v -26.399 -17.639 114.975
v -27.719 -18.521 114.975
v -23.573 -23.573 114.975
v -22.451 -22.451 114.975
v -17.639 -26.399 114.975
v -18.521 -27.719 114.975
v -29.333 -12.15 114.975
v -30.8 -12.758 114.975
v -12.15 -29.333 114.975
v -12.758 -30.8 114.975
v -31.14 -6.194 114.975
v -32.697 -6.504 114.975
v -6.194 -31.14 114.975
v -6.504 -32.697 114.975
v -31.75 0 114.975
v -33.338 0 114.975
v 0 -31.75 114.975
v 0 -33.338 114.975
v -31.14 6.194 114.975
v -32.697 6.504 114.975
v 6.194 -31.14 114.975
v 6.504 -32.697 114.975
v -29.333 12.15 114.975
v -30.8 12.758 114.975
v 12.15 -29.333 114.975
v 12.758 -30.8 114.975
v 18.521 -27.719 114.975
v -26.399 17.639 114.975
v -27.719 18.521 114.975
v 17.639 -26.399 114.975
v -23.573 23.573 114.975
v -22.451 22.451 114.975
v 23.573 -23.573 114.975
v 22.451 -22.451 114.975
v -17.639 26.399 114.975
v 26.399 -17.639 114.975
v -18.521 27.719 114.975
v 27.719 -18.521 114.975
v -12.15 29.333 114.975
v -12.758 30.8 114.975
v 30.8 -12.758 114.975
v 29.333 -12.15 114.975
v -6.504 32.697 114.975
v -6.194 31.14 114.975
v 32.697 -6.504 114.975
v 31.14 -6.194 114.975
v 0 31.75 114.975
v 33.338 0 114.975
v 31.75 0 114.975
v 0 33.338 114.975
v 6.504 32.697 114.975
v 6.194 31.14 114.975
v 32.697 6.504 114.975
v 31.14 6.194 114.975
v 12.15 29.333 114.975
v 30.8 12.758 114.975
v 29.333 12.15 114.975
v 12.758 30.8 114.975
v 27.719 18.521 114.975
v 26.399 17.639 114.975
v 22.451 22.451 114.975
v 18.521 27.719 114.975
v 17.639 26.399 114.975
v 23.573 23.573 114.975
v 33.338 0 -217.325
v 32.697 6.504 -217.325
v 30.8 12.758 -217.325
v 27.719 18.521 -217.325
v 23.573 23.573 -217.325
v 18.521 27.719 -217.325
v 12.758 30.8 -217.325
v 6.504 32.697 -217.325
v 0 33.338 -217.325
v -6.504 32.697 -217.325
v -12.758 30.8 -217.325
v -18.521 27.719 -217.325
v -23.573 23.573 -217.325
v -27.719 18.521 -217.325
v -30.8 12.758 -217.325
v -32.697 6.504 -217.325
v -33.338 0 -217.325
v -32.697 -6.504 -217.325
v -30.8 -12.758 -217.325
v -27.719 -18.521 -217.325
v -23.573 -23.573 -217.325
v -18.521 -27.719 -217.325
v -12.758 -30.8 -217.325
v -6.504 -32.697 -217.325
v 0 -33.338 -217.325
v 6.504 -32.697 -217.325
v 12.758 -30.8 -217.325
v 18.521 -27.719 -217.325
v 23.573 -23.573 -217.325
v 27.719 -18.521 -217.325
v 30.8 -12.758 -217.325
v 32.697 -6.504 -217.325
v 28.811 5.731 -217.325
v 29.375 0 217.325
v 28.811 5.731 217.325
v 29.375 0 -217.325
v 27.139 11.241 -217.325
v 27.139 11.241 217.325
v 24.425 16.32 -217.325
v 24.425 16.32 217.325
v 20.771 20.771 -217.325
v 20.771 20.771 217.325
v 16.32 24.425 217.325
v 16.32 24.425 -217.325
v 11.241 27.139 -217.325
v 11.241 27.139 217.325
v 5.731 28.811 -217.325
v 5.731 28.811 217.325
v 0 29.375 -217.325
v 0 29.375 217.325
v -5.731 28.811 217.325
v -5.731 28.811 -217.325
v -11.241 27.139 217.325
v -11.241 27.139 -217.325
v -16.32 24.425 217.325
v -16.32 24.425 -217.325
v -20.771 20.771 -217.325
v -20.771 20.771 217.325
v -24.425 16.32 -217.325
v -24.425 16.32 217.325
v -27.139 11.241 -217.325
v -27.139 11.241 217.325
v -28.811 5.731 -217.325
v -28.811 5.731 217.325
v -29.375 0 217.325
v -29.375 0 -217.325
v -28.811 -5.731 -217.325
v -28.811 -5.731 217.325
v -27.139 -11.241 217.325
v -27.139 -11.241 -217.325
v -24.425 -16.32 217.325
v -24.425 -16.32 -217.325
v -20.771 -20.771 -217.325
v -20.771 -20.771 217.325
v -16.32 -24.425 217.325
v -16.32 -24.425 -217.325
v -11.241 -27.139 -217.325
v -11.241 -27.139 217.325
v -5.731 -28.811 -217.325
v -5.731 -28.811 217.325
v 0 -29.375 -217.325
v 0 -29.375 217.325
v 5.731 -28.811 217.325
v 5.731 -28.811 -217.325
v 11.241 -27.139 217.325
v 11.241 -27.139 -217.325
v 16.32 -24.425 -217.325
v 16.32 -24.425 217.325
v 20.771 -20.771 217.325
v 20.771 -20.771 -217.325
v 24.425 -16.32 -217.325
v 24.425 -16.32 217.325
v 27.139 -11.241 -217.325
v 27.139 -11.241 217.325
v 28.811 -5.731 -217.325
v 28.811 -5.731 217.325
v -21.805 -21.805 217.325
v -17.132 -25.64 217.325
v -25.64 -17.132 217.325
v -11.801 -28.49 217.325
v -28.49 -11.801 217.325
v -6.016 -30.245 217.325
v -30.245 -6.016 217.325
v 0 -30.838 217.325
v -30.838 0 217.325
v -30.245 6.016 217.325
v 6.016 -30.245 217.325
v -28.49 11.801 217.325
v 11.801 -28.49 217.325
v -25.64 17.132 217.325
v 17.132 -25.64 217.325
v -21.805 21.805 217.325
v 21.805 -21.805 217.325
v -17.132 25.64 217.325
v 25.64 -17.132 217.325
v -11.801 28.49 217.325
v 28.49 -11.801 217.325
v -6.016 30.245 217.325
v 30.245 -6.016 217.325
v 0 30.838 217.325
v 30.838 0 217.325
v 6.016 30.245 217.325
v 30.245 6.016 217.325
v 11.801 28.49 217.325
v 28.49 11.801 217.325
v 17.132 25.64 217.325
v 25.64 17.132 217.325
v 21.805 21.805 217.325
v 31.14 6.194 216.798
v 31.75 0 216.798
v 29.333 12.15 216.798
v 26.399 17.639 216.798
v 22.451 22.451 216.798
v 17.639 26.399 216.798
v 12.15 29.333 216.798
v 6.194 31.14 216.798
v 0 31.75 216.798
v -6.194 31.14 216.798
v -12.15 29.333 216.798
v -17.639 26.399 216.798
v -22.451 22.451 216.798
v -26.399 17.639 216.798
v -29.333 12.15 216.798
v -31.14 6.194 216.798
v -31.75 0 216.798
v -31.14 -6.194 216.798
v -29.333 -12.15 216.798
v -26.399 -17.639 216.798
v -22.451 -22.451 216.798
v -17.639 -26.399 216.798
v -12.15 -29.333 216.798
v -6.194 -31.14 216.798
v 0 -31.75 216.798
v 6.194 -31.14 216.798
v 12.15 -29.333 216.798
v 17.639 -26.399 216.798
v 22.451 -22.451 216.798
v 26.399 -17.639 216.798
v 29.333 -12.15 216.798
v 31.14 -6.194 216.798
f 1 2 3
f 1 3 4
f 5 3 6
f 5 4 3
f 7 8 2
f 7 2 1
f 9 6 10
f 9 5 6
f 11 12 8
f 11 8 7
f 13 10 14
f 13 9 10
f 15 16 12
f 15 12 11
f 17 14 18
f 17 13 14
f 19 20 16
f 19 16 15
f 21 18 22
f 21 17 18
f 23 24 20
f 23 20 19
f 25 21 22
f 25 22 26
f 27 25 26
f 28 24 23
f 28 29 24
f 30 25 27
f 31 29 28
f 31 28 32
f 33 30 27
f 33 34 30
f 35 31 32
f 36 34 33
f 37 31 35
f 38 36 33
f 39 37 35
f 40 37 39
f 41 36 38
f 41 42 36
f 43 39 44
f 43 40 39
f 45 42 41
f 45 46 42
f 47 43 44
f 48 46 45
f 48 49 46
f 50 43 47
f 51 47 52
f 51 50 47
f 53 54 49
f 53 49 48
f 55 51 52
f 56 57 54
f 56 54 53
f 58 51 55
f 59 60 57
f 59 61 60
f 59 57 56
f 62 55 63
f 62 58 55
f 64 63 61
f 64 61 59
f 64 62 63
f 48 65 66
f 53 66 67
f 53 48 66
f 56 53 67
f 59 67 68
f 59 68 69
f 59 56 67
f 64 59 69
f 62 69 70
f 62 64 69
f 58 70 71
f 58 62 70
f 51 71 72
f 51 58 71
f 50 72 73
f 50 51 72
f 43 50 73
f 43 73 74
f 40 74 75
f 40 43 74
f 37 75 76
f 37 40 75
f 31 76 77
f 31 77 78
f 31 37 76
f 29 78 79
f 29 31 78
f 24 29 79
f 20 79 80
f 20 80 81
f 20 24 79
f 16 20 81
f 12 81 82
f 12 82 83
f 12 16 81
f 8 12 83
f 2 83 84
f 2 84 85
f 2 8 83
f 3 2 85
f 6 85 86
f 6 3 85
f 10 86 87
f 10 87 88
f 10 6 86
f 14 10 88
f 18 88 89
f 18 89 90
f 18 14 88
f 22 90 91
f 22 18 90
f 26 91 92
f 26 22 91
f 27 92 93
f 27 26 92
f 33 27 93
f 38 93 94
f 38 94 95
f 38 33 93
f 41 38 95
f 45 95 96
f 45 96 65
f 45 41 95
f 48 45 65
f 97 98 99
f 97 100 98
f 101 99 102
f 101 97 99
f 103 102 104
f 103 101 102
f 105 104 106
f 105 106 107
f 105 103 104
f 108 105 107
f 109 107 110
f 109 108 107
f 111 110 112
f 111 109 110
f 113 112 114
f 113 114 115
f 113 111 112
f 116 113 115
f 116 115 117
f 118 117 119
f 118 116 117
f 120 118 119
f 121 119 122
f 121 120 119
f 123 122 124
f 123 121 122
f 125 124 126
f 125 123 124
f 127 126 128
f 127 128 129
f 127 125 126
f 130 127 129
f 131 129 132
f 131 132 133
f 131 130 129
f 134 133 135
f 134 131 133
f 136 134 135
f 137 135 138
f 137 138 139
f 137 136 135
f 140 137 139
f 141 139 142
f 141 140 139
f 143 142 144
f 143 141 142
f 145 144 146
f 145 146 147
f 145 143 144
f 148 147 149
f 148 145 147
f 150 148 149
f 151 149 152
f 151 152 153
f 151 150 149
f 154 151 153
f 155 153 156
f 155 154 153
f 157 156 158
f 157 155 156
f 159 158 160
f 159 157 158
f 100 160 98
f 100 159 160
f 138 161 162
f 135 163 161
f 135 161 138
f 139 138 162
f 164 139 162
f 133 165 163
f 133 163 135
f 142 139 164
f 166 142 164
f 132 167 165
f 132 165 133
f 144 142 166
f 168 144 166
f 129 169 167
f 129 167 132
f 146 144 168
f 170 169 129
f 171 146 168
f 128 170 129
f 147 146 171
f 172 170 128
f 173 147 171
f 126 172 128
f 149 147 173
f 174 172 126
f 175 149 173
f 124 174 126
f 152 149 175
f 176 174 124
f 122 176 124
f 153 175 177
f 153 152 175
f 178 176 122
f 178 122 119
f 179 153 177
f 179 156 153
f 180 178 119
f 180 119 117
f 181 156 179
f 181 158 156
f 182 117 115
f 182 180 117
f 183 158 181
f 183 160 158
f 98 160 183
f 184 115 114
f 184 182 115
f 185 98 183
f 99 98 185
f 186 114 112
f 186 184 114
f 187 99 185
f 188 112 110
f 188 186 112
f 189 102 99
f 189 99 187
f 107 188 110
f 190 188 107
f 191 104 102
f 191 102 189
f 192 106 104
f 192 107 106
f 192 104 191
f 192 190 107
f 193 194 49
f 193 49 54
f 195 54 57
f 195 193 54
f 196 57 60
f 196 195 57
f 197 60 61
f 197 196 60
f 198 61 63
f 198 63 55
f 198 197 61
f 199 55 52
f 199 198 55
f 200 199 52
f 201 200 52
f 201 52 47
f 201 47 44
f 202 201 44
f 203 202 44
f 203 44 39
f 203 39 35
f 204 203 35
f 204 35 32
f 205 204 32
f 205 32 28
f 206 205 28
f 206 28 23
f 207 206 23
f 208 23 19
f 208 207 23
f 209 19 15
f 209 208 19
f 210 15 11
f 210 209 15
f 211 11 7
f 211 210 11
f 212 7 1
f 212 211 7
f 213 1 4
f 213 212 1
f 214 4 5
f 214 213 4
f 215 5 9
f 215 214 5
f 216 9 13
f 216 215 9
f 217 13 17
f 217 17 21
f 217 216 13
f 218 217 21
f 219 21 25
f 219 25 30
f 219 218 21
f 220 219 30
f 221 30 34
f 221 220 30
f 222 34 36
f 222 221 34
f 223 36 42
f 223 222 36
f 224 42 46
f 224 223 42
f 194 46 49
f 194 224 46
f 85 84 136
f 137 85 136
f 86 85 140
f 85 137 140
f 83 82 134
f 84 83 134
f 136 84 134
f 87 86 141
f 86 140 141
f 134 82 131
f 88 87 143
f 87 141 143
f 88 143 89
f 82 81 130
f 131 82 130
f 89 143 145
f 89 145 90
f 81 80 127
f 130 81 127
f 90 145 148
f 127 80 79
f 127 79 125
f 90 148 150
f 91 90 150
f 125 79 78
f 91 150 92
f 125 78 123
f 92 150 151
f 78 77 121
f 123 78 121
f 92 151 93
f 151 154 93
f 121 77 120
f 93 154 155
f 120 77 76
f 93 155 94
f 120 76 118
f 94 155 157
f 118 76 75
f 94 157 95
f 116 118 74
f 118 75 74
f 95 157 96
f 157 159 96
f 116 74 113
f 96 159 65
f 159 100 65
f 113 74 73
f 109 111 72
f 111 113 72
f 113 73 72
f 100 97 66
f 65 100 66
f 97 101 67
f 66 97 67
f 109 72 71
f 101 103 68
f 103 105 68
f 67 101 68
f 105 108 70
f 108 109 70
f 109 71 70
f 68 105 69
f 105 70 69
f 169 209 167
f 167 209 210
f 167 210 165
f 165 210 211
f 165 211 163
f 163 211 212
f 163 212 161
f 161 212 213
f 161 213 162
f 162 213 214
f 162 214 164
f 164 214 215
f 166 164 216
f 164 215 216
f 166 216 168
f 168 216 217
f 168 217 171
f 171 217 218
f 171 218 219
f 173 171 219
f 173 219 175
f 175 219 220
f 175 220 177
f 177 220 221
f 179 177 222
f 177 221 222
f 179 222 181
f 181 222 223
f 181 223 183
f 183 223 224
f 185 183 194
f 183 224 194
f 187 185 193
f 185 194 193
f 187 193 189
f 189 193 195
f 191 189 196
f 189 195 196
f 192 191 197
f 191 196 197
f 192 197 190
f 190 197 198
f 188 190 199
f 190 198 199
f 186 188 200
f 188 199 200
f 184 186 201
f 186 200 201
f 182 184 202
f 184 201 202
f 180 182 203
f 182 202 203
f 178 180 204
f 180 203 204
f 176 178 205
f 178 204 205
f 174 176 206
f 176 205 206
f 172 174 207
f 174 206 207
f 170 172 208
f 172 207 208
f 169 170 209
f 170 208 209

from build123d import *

# Parameters (mm, degrees)
SKETCH3_R           = 33.3375
SKETCH3_R_2         = 29.3751
BOSS_EXTRUDE1_DEPTH = 217.325
SKETCH4_R           = 33.3375
SKETCH4_R_2         = 31.75
CUT_EXTRUDE1_DEPTH  = 102.35


with BuildPart() as part:
    # Sketch3 → Boss-Extrude1 (new, symmetric)
    with BuildSketch(Plane.XY):
        Circle(SKETCH3_R)
        Circle(SKETCH3_R_2, mode=Mode.SUBTRACT)
    extrude(amount=BOSS_EXTRUDE1_DEPTH, both=True)

    # Sketch5 → Cut-Revolve1 (revolve, cut)
    with BuildSketch(Plane(origin=(0, 0, 0), x_dir=(0, 0, -1), z_dir=(1, 0, 0)), mode=Mode.PRIVATE) as cut_revolve1_sk:
        Polygon((-217.325, 30.8375), (-215.881624327, 33.3375), (-217.325, 33.3375), align=None)
    revolve(cut_revolve1_sk.sketch.rotate(Axis((0, 0, 0), (0, 0, 1)), 90), axis=Axis((0, 0, 0), (0, 0, 1)), mode=Mode.SUBTRACT)

    # Sketch4 → Cut-Extrude1 (cut)
    with BuildSketch(Plane.XY.offset(217.325)):
        Circle(SKETCH4_R)
        Circle(SKETCH4_R_2, mode=Mode.SUBTRACT)
    extrude(amount=-CUT_EXTRUDE1_DEPTH, mode=Mode.SUBTRACT)


solid = part.part
